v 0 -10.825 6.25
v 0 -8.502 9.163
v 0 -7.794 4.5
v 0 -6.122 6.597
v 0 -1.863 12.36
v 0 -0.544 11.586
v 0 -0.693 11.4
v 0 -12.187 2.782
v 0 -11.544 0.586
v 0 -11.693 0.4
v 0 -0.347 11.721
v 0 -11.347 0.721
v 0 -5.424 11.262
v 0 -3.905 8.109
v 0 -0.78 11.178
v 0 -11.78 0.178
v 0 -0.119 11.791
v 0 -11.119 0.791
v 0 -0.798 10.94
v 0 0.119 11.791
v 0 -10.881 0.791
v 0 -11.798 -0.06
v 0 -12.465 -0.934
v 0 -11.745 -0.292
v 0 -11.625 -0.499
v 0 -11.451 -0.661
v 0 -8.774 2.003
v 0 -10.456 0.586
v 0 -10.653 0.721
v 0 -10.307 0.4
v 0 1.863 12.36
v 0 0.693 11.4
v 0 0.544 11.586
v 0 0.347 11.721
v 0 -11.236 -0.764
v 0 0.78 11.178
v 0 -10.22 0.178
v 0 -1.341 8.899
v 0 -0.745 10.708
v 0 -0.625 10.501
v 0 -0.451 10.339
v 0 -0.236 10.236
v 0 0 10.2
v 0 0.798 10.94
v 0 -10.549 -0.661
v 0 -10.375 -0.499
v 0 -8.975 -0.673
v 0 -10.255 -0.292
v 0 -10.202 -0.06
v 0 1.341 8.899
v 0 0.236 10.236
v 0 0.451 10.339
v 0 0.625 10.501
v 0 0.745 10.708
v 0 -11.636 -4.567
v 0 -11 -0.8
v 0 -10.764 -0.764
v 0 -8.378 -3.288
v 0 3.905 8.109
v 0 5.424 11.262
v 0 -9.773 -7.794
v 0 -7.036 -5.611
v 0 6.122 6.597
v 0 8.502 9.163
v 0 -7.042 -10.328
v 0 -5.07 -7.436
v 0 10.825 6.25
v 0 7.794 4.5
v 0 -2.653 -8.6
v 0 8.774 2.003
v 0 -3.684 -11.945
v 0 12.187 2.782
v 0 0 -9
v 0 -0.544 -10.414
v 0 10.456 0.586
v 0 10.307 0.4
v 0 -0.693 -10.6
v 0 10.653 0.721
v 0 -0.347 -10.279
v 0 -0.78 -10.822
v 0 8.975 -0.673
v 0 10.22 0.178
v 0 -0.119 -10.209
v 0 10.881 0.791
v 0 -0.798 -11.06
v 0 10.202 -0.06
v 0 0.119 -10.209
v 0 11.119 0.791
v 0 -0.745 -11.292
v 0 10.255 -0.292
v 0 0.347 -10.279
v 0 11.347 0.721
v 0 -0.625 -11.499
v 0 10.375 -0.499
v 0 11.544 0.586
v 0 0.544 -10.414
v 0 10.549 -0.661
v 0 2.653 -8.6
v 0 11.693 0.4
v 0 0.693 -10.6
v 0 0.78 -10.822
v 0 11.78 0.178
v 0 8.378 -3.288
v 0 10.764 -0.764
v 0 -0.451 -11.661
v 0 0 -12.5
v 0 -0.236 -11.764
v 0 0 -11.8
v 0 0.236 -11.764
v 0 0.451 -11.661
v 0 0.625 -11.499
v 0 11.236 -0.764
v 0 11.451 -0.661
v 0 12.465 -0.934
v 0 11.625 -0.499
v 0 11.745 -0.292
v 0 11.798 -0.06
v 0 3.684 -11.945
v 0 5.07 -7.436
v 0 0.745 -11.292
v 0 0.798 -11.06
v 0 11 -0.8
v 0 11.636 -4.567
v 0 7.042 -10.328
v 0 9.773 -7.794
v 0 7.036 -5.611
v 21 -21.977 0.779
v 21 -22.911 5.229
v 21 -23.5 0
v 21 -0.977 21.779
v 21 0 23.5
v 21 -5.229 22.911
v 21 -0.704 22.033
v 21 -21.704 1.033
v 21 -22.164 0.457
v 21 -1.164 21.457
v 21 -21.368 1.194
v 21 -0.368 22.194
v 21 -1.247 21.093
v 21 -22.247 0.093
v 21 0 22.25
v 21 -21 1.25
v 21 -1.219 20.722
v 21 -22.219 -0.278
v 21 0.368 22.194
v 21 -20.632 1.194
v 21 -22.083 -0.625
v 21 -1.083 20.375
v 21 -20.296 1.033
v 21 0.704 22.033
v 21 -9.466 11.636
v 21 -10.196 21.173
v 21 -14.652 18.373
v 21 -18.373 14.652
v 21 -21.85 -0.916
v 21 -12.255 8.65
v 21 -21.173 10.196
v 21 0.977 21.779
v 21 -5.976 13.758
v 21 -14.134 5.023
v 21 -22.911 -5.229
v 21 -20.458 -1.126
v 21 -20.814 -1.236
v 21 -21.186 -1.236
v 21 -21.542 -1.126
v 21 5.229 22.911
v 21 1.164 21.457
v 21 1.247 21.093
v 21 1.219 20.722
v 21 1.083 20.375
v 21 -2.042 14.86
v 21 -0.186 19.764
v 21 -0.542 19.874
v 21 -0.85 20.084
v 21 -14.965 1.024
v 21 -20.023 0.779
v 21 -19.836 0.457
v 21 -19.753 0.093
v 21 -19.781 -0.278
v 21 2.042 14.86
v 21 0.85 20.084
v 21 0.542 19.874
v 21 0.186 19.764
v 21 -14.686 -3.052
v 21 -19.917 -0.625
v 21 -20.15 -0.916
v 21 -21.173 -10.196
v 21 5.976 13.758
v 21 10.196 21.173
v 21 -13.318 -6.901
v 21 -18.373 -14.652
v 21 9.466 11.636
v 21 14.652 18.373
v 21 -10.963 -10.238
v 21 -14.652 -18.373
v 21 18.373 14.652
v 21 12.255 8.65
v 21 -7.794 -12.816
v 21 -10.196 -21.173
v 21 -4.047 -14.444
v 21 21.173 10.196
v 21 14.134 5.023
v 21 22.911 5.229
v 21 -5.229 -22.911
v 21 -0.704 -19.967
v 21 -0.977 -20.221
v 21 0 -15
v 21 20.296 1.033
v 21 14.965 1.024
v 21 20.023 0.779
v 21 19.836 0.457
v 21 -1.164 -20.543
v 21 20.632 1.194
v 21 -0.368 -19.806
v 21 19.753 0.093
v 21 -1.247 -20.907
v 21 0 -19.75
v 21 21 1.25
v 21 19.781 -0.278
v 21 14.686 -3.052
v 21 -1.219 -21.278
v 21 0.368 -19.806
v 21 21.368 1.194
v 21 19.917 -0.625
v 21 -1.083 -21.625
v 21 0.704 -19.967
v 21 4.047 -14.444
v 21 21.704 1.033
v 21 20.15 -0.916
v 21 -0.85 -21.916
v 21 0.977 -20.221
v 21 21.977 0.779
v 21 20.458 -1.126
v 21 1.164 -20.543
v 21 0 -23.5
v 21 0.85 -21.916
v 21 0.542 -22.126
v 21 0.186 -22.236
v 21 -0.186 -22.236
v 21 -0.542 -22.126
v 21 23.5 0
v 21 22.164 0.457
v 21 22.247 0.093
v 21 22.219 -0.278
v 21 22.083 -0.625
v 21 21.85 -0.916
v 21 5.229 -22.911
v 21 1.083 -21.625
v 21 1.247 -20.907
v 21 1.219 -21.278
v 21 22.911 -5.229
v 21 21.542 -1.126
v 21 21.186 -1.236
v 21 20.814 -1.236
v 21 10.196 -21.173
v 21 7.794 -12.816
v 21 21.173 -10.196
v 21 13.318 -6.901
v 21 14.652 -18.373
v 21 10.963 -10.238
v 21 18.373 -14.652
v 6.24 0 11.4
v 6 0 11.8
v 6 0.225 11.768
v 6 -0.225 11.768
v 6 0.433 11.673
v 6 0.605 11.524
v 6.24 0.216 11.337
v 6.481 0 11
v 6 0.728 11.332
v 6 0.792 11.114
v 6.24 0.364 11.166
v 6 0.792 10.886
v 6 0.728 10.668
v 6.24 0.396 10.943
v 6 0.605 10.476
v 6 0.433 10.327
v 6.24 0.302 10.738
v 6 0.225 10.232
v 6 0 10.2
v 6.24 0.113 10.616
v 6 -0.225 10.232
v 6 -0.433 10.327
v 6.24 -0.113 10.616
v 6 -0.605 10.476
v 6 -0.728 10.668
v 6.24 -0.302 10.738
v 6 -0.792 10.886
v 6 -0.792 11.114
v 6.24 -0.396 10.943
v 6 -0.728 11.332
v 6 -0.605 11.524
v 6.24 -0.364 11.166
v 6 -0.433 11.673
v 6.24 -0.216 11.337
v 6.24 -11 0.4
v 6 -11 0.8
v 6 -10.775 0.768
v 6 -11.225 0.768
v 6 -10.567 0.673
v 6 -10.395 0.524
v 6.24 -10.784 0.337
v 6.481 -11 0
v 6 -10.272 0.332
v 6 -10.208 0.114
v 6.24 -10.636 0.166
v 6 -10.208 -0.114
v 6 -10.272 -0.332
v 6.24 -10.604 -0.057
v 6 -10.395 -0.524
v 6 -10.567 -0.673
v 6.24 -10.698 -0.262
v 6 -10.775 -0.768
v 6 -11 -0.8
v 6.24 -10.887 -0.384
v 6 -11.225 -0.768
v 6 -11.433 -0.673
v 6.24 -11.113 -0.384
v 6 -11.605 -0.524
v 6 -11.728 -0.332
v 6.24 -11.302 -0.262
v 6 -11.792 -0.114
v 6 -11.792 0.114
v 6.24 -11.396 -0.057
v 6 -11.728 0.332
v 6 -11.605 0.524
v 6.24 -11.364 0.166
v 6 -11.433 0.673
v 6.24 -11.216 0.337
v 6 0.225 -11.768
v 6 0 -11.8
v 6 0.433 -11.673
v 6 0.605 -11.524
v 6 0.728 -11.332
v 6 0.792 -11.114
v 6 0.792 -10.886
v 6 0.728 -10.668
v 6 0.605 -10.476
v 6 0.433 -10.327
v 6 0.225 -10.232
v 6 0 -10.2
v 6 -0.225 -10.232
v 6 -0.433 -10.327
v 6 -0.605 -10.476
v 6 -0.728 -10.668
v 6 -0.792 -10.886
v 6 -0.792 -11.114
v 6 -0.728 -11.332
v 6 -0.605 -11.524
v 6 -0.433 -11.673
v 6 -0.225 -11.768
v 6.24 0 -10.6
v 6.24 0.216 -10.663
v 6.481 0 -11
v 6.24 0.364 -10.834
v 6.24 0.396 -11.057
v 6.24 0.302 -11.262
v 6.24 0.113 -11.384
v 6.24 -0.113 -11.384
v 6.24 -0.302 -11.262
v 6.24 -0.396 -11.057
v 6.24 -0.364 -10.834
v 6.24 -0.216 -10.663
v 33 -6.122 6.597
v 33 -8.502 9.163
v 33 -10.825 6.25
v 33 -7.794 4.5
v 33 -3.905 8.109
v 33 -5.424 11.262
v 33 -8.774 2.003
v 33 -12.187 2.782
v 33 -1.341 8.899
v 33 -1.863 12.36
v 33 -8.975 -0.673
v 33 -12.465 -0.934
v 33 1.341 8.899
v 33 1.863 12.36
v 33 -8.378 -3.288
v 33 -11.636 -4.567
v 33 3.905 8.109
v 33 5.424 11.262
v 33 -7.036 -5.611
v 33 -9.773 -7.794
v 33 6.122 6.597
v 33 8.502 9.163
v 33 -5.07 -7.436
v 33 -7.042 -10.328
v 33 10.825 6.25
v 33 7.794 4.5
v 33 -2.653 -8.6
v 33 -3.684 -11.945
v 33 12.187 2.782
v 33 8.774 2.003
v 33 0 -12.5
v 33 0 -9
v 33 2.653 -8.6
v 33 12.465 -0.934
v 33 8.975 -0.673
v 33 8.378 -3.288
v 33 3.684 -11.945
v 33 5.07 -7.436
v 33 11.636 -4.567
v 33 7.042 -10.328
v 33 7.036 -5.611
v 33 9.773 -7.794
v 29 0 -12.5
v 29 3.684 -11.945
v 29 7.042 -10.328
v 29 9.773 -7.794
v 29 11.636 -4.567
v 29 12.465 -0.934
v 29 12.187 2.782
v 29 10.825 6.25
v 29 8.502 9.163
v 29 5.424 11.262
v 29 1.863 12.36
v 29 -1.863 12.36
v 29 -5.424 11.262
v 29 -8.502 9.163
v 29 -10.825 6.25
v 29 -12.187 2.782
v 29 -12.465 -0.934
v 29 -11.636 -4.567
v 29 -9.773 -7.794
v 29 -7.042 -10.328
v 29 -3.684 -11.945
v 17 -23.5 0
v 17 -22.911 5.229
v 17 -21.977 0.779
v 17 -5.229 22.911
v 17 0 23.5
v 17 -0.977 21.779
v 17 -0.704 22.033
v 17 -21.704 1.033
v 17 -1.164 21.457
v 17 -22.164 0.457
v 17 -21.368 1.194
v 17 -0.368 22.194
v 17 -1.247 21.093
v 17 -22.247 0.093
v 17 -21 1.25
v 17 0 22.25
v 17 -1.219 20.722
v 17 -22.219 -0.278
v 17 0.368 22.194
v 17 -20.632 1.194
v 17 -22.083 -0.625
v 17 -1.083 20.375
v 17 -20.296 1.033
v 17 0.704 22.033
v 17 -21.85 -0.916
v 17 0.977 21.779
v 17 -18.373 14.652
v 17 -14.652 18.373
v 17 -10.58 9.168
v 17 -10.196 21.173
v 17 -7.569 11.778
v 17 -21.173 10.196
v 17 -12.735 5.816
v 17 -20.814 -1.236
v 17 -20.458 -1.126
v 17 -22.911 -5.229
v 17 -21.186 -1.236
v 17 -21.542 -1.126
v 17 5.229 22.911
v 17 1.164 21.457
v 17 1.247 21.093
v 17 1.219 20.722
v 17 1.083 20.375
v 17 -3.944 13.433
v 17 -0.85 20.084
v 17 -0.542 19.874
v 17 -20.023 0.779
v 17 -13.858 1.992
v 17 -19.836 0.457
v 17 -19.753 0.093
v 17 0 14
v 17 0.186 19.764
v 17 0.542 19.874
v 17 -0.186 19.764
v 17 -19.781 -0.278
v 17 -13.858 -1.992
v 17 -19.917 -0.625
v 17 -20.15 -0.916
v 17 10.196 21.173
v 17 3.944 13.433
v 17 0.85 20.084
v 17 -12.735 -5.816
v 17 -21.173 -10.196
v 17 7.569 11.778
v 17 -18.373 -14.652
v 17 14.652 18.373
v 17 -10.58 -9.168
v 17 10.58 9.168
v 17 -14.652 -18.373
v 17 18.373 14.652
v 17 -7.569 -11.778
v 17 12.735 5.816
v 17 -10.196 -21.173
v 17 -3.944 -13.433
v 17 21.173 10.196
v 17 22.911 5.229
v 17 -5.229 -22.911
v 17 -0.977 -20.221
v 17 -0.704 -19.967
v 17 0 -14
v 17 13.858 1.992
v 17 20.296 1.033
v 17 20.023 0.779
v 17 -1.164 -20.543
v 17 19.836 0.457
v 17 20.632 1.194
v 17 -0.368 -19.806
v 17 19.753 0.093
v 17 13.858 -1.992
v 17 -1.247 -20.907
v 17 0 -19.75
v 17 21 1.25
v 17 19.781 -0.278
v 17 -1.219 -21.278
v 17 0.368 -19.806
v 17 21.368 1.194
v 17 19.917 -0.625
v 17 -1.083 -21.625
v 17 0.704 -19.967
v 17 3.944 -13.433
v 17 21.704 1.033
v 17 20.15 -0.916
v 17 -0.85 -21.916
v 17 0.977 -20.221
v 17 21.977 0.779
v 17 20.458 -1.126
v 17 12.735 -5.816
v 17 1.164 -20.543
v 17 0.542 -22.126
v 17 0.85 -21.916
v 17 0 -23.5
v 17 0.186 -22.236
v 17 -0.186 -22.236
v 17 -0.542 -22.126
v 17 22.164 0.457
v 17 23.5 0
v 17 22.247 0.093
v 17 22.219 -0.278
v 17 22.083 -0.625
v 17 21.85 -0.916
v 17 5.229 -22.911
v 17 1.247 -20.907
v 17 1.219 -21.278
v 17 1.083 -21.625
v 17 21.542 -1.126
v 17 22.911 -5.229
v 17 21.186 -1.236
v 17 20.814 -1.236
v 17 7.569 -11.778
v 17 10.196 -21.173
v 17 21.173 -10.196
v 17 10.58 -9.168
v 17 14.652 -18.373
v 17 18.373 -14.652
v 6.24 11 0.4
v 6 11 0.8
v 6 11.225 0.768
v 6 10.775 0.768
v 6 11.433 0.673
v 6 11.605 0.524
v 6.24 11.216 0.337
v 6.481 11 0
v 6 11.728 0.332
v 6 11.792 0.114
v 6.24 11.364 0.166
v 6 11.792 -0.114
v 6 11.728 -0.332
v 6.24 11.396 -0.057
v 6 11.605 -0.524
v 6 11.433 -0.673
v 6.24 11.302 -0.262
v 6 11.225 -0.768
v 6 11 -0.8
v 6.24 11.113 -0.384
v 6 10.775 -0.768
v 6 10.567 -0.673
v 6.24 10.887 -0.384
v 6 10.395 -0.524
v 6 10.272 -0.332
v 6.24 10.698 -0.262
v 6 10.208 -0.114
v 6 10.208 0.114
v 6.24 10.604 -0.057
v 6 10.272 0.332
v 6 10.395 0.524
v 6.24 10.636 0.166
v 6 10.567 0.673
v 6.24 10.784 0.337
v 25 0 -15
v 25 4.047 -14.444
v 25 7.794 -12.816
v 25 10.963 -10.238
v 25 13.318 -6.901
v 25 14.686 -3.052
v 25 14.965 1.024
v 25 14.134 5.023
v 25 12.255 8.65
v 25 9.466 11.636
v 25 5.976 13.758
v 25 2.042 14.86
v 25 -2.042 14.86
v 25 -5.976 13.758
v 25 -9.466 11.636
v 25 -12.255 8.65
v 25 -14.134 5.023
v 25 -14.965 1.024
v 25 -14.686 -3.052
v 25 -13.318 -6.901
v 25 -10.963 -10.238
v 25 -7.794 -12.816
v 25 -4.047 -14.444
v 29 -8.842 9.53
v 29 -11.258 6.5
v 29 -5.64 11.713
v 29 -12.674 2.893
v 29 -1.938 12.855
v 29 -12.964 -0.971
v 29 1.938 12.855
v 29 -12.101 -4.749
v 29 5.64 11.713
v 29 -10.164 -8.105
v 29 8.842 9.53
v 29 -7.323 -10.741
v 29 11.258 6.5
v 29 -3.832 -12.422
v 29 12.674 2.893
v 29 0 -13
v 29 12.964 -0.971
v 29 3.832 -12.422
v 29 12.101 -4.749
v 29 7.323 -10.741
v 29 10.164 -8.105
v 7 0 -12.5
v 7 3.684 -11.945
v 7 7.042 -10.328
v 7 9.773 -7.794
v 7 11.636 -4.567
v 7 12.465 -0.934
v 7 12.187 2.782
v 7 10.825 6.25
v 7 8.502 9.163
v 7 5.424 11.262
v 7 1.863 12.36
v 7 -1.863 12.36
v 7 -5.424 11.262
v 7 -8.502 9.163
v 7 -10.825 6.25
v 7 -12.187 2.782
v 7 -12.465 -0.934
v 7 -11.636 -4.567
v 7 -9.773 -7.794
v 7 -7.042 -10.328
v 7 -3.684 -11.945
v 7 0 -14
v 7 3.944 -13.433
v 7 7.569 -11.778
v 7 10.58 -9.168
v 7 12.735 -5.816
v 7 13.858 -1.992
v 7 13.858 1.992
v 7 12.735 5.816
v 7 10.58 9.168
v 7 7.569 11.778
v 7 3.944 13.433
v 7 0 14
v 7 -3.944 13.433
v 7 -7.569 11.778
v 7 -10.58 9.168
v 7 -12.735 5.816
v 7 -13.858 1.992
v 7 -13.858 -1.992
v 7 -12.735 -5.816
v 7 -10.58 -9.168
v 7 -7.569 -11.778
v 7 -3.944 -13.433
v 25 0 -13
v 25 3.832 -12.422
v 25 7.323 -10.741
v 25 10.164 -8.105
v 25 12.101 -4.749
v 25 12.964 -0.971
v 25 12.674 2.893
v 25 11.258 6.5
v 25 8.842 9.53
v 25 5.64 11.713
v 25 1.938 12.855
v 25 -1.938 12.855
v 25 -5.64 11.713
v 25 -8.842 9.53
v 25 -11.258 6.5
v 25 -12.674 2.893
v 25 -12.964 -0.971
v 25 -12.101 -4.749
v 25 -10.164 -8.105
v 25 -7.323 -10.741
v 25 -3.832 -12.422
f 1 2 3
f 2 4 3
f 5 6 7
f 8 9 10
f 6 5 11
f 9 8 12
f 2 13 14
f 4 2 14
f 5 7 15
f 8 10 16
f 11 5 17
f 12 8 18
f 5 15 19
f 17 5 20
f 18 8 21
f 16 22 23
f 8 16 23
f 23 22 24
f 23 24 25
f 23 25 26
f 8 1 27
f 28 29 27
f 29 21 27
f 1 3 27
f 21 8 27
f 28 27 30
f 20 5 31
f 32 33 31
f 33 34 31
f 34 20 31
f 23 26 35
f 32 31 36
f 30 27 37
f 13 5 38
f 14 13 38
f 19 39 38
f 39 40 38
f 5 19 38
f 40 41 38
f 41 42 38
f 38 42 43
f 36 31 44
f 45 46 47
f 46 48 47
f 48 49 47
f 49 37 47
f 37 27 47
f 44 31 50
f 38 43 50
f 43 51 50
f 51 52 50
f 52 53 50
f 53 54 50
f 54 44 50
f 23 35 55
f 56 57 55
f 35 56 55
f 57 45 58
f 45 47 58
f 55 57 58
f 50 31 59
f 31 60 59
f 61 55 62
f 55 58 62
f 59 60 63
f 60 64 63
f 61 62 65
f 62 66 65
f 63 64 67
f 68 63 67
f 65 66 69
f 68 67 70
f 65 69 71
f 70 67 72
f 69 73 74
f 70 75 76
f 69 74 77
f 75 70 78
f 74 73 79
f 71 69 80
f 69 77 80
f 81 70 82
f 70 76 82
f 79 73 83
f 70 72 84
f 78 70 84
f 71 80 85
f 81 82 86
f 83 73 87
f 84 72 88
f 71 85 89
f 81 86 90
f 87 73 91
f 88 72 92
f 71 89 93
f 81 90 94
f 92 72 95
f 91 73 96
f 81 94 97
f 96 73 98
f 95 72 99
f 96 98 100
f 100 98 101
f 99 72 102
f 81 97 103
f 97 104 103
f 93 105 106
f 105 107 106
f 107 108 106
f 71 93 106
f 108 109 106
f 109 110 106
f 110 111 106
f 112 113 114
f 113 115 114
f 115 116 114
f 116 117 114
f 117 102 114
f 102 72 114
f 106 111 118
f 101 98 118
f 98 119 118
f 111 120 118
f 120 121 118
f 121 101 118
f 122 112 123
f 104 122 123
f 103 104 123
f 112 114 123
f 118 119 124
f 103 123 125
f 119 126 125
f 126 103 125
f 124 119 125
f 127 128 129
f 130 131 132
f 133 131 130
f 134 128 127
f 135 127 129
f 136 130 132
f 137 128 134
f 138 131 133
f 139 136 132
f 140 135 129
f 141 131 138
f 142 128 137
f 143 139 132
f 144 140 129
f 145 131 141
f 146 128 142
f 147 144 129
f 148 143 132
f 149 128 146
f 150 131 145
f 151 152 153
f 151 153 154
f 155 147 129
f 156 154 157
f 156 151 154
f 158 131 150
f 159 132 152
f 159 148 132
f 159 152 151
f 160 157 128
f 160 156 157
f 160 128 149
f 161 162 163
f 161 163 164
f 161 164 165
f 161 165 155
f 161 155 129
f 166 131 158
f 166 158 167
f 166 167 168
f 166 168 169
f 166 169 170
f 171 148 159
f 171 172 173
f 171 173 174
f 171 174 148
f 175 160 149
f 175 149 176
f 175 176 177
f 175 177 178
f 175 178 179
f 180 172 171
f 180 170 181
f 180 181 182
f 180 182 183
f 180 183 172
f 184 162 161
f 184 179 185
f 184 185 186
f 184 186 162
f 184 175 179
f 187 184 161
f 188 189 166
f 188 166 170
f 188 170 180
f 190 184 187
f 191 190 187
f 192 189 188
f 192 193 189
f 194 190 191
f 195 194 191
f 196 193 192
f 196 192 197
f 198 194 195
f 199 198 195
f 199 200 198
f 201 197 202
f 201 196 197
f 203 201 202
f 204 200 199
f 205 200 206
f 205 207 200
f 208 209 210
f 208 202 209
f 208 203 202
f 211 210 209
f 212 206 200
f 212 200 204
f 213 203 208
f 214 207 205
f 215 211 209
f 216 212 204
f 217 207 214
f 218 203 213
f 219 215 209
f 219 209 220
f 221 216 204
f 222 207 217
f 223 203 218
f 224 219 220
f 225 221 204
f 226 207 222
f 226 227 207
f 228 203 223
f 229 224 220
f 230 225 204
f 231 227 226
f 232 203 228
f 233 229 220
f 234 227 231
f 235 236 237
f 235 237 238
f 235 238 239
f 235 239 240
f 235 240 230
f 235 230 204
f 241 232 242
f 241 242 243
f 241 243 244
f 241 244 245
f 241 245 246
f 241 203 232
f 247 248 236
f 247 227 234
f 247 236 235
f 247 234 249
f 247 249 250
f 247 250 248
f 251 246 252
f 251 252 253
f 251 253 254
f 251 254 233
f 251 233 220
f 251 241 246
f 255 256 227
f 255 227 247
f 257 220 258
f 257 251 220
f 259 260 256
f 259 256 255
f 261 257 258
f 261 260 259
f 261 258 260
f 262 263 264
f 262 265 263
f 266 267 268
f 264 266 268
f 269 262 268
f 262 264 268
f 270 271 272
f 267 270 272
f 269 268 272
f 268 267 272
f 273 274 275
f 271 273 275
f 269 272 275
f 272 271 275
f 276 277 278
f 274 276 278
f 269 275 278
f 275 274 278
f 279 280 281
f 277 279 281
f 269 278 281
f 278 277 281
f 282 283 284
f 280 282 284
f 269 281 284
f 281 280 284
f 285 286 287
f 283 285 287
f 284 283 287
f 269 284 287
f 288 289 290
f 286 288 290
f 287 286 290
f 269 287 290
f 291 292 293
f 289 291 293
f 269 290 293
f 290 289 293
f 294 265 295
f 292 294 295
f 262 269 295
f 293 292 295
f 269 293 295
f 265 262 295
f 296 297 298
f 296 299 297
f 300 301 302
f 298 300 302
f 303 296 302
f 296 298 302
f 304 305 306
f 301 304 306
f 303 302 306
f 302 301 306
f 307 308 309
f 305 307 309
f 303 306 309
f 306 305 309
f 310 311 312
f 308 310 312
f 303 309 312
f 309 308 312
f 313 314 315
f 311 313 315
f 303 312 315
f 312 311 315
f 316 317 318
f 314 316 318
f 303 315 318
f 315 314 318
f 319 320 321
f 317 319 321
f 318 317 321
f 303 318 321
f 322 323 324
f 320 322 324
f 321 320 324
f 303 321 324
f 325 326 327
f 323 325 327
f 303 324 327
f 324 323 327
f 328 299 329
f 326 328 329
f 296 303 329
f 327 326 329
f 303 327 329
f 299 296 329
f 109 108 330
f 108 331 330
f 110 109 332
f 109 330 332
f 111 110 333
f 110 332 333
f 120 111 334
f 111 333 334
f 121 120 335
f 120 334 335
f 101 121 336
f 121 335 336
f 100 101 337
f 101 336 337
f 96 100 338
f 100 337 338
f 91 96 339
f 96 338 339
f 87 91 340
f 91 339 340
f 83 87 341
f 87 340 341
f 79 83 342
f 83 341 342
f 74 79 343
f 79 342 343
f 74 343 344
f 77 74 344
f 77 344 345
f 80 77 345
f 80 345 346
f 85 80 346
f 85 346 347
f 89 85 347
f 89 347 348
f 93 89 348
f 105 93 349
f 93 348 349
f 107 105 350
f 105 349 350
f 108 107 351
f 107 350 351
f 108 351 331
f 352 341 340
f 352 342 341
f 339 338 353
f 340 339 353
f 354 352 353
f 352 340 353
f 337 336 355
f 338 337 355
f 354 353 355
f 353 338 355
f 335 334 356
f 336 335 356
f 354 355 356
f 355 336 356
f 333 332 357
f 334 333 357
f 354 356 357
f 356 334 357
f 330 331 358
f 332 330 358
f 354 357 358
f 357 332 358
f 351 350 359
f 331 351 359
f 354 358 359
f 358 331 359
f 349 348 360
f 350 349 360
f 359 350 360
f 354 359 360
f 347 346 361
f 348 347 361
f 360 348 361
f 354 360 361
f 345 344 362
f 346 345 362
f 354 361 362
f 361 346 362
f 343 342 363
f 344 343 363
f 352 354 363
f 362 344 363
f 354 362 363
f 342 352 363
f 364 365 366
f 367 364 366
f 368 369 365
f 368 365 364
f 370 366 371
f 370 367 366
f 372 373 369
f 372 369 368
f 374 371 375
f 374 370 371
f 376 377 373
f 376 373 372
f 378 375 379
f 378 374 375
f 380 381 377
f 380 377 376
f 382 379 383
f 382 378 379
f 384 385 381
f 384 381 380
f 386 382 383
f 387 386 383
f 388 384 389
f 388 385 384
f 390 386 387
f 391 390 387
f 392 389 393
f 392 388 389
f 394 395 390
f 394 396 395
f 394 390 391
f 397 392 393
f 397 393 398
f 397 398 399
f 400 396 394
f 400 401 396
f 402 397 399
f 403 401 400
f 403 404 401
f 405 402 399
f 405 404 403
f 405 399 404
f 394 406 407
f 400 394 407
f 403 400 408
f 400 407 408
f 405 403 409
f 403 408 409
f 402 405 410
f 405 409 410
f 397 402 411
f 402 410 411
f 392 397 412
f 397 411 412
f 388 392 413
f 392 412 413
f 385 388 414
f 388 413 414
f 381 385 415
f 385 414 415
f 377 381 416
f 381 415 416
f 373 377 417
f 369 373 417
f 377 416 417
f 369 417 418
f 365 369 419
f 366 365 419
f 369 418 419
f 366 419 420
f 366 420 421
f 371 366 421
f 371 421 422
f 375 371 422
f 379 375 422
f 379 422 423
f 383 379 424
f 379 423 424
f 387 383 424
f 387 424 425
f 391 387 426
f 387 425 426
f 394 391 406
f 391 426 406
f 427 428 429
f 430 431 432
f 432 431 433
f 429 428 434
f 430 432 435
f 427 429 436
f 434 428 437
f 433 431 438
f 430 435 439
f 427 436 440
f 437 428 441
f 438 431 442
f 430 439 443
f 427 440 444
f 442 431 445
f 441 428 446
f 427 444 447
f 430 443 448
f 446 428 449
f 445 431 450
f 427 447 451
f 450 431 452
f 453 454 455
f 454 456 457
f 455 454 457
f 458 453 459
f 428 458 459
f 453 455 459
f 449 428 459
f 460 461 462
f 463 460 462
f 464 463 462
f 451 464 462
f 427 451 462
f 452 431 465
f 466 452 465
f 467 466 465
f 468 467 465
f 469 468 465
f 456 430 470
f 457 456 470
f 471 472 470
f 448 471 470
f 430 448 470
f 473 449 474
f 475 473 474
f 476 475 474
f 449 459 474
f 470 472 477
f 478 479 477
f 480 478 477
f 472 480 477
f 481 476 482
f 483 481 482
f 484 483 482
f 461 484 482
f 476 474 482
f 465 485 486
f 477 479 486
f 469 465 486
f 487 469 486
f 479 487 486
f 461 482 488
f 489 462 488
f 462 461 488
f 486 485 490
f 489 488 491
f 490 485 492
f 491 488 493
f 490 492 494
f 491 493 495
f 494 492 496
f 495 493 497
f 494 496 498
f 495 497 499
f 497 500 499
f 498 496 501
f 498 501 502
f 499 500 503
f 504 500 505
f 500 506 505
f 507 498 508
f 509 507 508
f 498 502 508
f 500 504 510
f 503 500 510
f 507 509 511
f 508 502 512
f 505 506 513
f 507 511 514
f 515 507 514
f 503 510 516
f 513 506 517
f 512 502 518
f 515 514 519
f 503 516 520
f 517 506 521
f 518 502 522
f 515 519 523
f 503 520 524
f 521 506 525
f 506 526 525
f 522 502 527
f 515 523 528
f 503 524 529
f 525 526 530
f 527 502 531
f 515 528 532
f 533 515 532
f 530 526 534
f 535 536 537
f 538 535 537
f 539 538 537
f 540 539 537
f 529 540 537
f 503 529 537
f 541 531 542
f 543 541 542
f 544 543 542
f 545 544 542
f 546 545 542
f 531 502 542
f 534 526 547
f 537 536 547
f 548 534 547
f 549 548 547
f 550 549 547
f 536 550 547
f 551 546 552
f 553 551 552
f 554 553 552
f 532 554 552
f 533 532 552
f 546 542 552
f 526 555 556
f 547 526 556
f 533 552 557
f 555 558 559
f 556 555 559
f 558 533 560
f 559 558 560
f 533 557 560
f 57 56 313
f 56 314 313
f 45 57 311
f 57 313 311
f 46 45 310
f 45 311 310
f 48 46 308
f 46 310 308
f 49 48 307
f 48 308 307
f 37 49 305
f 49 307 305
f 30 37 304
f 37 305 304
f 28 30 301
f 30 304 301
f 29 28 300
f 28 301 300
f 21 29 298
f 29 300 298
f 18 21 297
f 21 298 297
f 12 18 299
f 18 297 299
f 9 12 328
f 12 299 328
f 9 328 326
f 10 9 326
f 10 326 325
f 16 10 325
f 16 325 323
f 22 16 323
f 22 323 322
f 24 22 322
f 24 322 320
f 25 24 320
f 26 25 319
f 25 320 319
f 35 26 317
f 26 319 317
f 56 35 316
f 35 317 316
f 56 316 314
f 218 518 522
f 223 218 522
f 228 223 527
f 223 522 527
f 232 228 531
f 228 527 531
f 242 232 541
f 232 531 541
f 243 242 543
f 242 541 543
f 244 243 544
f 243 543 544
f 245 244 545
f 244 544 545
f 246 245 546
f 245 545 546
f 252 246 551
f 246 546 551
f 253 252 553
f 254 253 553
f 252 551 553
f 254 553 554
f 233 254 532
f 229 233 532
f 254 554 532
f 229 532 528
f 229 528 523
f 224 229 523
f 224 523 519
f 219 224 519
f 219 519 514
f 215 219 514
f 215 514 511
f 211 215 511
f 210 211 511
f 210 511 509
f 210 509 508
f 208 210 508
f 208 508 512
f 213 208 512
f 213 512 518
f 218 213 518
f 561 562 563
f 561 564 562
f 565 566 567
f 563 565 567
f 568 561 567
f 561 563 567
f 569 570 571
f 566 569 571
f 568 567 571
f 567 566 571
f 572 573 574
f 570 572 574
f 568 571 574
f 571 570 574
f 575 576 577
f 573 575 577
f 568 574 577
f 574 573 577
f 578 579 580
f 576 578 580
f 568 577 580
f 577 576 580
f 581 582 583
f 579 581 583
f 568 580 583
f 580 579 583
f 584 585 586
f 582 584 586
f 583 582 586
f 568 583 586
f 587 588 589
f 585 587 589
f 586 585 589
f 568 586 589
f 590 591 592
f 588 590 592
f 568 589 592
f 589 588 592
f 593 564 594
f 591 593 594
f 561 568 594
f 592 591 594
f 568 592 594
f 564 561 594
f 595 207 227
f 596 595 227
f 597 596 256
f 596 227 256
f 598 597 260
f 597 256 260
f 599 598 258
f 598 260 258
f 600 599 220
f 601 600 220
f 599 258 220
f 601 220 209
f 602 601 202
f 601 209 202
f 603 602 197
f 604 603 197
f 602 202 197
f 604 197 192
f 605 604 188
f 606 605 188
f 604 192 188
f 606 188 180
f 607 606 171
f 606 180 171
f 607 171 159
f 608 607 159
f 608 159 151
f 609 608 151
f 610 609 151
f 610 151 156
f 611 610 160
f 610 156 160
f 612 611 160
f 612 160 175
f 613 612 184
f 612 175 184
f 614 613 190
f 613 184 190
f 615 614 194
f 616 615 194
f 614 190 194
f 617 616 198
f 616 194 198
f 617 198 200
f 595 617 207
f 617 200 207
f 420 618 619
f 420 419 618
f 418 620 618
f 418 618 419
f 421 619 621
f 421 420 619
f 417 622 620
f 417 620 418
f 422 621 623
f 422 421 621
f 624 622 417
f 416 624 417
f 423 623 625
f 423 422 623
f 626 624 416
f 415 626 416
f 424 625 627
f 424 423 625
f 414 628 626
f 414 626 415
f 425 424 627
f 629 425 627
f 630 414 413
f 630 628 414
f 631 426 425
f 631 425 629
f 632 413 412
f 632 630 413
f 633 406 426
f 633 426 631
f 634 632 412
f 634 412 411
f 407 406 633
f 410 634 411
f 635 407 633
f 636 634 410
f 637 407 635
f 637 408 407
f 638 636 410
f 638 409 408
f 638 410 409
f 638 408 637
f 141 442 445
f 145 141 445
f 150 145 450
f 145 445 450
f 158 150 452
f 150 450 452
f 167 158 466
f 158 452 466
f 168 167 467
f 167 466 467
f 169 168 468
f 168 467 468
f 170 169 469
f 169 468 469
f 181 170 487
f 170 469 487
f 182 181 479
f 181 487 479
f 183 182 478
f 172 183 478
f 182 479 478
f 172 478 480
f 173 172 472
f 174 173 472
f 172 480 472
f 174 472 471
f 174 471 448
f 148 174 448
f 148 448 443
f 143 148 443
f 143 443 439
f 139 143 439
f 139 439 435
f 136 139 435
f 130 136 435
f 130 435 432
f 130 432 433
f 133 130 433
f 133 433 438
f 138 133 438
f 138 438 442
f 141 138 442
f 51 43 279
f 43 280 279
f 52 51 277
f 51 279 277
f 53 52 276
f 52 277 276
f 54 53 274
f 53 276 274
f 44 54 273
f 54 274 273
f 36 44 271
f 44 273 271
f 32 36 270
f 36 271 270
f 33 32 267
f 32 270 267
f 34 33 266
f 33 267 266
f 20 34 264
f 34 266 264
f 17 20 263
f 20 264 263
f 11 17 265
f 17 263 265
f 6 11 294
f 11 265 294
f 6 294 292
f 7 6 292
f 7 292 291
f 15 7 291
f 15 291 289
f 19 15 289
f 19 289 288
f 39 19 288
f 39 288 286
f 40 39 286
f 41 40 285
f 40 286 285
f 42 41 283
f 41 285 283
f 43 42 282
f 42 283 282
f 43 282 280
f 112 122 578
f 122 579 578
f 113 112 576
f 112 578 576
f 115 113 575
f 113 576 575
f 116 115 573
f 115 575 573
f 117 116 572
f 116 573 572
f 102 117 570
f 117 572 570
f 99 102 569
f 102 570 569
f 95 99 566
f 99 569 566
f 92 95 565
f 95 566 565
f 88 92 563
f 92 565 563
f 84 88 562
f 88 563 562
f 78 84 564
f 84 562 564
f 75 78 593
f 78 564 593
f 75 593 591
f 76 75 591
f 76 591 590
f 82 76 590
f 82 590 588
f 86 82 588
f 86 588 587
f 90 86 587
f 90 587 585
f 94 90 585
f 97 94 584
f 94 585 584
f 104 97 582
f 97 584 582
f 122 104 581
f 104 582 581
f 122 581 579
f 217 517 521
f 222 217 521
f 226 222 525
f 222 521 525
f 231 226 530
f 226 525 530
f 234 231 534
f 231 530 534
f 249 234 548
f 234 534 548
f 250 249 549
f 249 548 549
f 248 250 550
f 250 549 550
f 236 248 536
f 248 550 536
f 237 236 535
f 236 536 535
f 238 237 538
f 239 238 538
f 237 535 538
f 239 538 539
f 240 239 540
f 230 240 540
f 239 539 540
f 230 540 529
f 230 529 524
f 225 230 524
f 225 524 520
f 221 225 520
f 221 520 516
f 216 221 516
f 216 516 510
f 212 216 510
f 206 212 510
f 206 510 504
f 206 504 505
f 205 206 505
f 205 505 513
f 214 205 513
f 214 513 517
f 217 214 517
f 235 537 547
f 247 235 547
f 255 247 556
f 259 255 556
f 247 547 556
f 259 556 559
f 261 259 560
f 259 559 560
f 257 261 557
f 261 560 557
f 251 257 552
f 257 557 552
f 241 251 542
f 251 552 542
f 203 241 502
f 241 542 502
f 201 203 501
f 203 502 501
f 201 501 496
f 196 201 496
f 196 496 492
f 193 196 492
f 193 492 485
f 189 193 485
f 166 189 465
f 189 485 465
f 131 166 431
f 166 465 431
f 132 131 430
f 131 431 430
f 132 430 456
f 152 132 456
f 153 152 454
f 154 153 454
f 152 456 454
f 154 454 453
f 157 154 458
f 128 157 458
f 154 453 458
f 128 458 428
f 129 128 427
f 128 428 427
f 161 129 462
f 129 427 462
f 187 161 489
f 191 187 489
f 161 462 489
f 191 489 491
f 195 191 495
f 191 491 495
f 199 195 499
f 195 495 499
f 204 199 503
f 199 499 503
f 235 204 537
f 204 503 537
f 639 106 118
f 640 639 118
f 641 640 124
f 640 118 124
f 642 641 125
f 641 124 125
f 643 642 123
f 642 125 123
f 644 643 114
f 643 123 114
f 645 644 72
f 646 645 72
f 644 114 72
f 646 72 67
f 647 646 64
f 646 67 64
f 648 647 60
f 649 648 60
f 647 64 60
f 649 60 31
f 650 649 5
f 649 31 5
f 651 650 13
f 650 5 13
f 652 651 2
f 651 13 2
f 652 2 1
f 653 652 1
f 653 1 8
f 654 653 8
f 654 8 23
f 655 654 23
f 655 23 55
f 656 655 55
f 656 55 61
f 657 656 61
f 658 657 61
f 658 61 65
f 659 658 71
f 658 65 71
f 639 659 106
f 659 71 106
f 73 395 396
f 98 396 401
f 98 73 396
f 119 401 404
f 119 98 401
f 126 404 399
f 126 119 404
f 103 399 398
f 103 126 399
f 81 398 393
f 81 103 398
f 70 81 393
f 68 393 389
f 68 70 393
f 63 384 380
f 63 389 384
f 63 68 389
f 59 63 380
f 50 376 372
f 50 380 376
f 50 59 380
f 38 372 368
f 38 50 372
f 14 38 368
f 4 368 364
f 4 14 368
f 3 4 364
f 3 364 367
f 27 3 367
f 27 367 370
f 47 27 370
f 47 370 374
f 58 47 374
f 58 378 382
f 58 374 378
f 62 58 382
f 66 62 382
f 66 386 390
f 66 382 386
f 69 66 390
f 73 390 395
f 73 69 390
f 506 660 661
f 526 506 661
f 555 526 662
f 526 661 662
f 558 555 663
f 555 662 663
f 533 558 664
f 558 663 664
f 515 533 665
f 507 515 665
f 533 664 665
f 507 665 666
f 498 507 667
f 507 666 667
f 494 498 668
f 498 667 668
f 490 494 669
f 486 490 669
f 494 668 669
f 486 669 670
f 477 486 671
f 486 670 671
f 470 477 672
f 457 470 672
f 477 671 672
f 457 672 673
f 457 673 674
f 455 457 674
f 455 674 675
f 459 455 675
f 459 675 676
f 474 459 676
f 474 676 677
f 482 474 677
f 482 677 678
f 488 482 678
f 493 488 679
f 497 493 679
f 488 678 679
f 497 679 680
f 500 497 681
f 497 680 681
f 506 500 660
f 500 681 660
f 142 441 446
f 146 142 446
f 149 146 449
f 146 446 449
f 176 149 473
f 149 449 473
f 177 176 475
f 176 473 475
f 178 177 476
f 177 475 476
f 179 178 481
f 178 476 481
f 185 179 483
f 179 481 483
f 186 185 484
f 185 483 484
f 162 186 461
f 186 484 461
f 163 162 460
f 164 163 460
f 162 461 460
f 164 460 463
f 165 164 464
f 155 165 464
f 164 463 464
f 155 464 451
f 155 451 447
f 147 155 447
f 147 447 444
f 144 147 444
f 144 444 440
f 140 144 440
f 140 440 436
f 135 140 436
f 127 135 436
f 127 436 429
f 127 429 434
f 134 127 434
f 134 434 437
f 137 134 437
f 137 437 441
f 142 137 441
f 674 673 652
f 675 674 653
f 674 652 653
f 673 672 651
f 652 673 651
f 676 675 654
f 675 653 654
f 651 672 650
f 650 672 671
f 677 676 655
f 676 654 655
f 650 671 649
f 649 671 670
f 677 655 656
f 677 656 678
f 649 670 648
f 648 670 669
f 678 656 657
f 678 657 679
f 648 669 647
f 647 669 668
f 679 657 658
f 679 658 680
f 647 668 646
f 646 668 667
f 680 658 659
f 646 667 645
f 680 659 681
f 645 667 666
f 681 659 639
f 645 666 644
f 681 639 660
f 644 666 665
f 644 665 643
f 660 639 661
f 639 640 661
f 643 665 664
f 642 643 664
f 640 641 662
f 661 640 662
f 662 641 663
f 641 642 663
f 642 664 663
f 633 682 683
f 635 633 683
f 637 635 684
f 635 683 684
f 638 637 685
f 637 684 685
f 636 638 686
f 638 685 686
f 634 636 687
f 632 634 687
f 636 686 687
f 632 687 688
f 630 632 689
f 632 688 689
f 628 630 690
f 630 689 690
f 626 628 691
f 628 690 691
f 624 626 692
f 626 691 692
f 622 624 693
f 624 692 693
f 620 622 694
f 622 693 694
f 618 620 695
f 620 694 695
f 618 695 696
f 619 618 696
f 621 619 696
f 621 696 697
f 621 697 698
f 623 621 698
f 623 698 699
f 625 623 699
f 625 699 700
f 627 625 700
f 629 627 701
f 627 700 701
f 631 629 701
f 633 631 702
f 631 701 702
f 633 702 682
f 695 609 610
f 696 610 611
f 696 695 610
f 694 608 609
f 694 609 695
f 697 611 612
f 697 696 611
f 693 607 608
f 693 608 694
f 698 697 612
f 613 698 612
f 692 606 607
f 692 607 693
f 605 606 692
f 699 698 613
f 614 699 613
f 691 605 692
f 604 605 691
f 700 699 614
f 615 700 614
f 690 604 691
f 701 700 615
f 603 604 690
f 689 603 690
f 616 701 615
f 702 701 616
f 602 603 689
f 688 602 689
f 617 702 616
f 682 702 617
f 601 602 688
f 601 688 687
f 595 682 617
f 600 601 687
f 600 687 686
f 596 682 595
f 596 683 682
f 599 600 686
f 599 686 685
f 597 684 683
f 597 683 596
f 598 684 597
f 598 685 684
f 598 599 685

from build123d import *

# Parameters (mm, degrees)
SKETCH_1_R             = 12.5
EXTRUDE_1_DEPTH        = 7
SKETCH_2_R             = 14
EXTRUDE_2_DEPTH        = 10
SKETCH_3_R             = 23.5
EXTRUDE_3_DEPTH        = 4
HOLE_WIZARD_M3_1_D     = 2.5
HOLE_WIZARD_M3_1_DEPTH = 8.5
HOLE_WIZARD_M3_1_TIP   = 0.751075774
HOLE_WIZARD_M2_1_D     = 1.6
HOLE_WIZARD_M2_1_DEPTH = 6
HOLE_WIZARD_M2_1_TIP   = 0.480688495
SKETCH_14_R            = 15
EXTRUDE_4_DEPTH        = 4
SKETCH_15_R            = 13
EXTRUDE_5_DEPTH        = 4
SKETCH_16_R            = 12.5
EXTRUDE_6_DEPTH        = 4
SKETCH_4_R             = 9
CUT_EXTRUDE_2_DEPTH    = 47.834816109


with BuildPart() as part:
    # 草图1 → 凸台-拉伸1 (new body)
    with BuildSketch(Plane(origin=(0, 0, 0), x_dir=(0, 0, -1), z_dir=(1, 0, 0))):
        Circle(SKETCH_1_R)
    extrude(amount=EXTRUDE_1_DEPTH)

    # 草图2 → 凸台-拉伸2 (add)
    with BuildSketch(Plane(origin=(7, 0, 0), x_dir=(0, 0, -1), z_dir=(1, 0, 0))):
        Circle(SKETCH_2_R)
    extrude(amount=EXTRUDE_2_DEPTH)

    # 草图3 → 凸台-拉伸3 (add)
    with BuildSketch(Plane(origin=(17, 0, 0), x_dir=(0, 0, -1), z_dir=(1, 0, 0))):
        Circle(SKETCH_3_R)
    extrude(amount=EXTRUDE_3_DEPTH)

    # M3 螺纹孔1
    with Locations(Plane(origin=(21, 0, 0), x_dir=(0, 0, -1), z_dir=(1, 0, 0))):
        with Locations((0, 21), (21, 0), (0, -21), (-21, 0)):
            Hole(HOLE_WIZARD_M3_1_D / 2, depth=HOLE_WIZARD_M3_1_DEPTH)
            with Locations((0, 0, -(HOLE_WIZARD_M3_1_DEPTH + HOLE_WIZARD_M3_1_TIP / 2))):  # 118° drill point
                Cone(0, HOLE_WIZARD_M3_1_D / 2, HOLE_WIZARD_M3_1_TIP, mode=Mode.SUBTRACT)

    # M2 螺纹孔1
    with Locations(Plane.ZY):
        with Locations((-11, 0), (0, -11), (11, 0), (0, 11)):
            Hole(HOLE_WIZARD_M2_1_D / 2, depth=HOLE_WIZARD_M2_1_DEPTH)
            with Locations((0, 0, -(HOLE_WIZARD_M2_1_DEPTH + HOLE_WIZARD_M2_1_TIP / 2))):  # 118° drill point
                Cone(0, HOLE_WIZARD_M2_1_D / 2, HOLE_WIZARD_M2_1_TIP, mode=Mode.SUBTRACT)

    # 草图14 → 凸台-拉伸4 (add)
    with BuildSketch(Plane(origin=(21, 0, 0), x_dir=(0, 0, -1), z_dir=(1, 0, 0))):
        Circle(SKETCH_14_R)
    extrude(amount=EXTRUDE_4_DEPTH)

    # 草图15 → 凸台-拉伸5 (add)
    with BuildSketch(Plane(origin=(25, 0, 0), x_dir=(0, 0, -1), z_dir=(1, 0, 0))):
        Circle(SKETCH_15_R)
    extrude(amount=EXTRUDE_5_DEPTH)

    # 草图16 → 凸台-拉伸6 (add)
    with BuildSketch(Plane(origin=(29, 0, 0), x_dir=(0, 0, -1), z_dir=(1, 0, 0))):
        Circle(SKETCH_16_R)
    extrude(amount=EXTRUDE_6_DEPTH)

    # 草图4 → 切除-拉伸2 (cut, through all)
    with BuildSketch(Plane(origin=(0, 0, 0), x_dir=(0, 0, -1), z_dir=(1, 0, 0))):
        Circle(SKETCH_4_R)
    extrude(amount=CUT_EXTRUDE_2_DEPTH, mode=Mode.SUBTRACT)


solid = part.part
